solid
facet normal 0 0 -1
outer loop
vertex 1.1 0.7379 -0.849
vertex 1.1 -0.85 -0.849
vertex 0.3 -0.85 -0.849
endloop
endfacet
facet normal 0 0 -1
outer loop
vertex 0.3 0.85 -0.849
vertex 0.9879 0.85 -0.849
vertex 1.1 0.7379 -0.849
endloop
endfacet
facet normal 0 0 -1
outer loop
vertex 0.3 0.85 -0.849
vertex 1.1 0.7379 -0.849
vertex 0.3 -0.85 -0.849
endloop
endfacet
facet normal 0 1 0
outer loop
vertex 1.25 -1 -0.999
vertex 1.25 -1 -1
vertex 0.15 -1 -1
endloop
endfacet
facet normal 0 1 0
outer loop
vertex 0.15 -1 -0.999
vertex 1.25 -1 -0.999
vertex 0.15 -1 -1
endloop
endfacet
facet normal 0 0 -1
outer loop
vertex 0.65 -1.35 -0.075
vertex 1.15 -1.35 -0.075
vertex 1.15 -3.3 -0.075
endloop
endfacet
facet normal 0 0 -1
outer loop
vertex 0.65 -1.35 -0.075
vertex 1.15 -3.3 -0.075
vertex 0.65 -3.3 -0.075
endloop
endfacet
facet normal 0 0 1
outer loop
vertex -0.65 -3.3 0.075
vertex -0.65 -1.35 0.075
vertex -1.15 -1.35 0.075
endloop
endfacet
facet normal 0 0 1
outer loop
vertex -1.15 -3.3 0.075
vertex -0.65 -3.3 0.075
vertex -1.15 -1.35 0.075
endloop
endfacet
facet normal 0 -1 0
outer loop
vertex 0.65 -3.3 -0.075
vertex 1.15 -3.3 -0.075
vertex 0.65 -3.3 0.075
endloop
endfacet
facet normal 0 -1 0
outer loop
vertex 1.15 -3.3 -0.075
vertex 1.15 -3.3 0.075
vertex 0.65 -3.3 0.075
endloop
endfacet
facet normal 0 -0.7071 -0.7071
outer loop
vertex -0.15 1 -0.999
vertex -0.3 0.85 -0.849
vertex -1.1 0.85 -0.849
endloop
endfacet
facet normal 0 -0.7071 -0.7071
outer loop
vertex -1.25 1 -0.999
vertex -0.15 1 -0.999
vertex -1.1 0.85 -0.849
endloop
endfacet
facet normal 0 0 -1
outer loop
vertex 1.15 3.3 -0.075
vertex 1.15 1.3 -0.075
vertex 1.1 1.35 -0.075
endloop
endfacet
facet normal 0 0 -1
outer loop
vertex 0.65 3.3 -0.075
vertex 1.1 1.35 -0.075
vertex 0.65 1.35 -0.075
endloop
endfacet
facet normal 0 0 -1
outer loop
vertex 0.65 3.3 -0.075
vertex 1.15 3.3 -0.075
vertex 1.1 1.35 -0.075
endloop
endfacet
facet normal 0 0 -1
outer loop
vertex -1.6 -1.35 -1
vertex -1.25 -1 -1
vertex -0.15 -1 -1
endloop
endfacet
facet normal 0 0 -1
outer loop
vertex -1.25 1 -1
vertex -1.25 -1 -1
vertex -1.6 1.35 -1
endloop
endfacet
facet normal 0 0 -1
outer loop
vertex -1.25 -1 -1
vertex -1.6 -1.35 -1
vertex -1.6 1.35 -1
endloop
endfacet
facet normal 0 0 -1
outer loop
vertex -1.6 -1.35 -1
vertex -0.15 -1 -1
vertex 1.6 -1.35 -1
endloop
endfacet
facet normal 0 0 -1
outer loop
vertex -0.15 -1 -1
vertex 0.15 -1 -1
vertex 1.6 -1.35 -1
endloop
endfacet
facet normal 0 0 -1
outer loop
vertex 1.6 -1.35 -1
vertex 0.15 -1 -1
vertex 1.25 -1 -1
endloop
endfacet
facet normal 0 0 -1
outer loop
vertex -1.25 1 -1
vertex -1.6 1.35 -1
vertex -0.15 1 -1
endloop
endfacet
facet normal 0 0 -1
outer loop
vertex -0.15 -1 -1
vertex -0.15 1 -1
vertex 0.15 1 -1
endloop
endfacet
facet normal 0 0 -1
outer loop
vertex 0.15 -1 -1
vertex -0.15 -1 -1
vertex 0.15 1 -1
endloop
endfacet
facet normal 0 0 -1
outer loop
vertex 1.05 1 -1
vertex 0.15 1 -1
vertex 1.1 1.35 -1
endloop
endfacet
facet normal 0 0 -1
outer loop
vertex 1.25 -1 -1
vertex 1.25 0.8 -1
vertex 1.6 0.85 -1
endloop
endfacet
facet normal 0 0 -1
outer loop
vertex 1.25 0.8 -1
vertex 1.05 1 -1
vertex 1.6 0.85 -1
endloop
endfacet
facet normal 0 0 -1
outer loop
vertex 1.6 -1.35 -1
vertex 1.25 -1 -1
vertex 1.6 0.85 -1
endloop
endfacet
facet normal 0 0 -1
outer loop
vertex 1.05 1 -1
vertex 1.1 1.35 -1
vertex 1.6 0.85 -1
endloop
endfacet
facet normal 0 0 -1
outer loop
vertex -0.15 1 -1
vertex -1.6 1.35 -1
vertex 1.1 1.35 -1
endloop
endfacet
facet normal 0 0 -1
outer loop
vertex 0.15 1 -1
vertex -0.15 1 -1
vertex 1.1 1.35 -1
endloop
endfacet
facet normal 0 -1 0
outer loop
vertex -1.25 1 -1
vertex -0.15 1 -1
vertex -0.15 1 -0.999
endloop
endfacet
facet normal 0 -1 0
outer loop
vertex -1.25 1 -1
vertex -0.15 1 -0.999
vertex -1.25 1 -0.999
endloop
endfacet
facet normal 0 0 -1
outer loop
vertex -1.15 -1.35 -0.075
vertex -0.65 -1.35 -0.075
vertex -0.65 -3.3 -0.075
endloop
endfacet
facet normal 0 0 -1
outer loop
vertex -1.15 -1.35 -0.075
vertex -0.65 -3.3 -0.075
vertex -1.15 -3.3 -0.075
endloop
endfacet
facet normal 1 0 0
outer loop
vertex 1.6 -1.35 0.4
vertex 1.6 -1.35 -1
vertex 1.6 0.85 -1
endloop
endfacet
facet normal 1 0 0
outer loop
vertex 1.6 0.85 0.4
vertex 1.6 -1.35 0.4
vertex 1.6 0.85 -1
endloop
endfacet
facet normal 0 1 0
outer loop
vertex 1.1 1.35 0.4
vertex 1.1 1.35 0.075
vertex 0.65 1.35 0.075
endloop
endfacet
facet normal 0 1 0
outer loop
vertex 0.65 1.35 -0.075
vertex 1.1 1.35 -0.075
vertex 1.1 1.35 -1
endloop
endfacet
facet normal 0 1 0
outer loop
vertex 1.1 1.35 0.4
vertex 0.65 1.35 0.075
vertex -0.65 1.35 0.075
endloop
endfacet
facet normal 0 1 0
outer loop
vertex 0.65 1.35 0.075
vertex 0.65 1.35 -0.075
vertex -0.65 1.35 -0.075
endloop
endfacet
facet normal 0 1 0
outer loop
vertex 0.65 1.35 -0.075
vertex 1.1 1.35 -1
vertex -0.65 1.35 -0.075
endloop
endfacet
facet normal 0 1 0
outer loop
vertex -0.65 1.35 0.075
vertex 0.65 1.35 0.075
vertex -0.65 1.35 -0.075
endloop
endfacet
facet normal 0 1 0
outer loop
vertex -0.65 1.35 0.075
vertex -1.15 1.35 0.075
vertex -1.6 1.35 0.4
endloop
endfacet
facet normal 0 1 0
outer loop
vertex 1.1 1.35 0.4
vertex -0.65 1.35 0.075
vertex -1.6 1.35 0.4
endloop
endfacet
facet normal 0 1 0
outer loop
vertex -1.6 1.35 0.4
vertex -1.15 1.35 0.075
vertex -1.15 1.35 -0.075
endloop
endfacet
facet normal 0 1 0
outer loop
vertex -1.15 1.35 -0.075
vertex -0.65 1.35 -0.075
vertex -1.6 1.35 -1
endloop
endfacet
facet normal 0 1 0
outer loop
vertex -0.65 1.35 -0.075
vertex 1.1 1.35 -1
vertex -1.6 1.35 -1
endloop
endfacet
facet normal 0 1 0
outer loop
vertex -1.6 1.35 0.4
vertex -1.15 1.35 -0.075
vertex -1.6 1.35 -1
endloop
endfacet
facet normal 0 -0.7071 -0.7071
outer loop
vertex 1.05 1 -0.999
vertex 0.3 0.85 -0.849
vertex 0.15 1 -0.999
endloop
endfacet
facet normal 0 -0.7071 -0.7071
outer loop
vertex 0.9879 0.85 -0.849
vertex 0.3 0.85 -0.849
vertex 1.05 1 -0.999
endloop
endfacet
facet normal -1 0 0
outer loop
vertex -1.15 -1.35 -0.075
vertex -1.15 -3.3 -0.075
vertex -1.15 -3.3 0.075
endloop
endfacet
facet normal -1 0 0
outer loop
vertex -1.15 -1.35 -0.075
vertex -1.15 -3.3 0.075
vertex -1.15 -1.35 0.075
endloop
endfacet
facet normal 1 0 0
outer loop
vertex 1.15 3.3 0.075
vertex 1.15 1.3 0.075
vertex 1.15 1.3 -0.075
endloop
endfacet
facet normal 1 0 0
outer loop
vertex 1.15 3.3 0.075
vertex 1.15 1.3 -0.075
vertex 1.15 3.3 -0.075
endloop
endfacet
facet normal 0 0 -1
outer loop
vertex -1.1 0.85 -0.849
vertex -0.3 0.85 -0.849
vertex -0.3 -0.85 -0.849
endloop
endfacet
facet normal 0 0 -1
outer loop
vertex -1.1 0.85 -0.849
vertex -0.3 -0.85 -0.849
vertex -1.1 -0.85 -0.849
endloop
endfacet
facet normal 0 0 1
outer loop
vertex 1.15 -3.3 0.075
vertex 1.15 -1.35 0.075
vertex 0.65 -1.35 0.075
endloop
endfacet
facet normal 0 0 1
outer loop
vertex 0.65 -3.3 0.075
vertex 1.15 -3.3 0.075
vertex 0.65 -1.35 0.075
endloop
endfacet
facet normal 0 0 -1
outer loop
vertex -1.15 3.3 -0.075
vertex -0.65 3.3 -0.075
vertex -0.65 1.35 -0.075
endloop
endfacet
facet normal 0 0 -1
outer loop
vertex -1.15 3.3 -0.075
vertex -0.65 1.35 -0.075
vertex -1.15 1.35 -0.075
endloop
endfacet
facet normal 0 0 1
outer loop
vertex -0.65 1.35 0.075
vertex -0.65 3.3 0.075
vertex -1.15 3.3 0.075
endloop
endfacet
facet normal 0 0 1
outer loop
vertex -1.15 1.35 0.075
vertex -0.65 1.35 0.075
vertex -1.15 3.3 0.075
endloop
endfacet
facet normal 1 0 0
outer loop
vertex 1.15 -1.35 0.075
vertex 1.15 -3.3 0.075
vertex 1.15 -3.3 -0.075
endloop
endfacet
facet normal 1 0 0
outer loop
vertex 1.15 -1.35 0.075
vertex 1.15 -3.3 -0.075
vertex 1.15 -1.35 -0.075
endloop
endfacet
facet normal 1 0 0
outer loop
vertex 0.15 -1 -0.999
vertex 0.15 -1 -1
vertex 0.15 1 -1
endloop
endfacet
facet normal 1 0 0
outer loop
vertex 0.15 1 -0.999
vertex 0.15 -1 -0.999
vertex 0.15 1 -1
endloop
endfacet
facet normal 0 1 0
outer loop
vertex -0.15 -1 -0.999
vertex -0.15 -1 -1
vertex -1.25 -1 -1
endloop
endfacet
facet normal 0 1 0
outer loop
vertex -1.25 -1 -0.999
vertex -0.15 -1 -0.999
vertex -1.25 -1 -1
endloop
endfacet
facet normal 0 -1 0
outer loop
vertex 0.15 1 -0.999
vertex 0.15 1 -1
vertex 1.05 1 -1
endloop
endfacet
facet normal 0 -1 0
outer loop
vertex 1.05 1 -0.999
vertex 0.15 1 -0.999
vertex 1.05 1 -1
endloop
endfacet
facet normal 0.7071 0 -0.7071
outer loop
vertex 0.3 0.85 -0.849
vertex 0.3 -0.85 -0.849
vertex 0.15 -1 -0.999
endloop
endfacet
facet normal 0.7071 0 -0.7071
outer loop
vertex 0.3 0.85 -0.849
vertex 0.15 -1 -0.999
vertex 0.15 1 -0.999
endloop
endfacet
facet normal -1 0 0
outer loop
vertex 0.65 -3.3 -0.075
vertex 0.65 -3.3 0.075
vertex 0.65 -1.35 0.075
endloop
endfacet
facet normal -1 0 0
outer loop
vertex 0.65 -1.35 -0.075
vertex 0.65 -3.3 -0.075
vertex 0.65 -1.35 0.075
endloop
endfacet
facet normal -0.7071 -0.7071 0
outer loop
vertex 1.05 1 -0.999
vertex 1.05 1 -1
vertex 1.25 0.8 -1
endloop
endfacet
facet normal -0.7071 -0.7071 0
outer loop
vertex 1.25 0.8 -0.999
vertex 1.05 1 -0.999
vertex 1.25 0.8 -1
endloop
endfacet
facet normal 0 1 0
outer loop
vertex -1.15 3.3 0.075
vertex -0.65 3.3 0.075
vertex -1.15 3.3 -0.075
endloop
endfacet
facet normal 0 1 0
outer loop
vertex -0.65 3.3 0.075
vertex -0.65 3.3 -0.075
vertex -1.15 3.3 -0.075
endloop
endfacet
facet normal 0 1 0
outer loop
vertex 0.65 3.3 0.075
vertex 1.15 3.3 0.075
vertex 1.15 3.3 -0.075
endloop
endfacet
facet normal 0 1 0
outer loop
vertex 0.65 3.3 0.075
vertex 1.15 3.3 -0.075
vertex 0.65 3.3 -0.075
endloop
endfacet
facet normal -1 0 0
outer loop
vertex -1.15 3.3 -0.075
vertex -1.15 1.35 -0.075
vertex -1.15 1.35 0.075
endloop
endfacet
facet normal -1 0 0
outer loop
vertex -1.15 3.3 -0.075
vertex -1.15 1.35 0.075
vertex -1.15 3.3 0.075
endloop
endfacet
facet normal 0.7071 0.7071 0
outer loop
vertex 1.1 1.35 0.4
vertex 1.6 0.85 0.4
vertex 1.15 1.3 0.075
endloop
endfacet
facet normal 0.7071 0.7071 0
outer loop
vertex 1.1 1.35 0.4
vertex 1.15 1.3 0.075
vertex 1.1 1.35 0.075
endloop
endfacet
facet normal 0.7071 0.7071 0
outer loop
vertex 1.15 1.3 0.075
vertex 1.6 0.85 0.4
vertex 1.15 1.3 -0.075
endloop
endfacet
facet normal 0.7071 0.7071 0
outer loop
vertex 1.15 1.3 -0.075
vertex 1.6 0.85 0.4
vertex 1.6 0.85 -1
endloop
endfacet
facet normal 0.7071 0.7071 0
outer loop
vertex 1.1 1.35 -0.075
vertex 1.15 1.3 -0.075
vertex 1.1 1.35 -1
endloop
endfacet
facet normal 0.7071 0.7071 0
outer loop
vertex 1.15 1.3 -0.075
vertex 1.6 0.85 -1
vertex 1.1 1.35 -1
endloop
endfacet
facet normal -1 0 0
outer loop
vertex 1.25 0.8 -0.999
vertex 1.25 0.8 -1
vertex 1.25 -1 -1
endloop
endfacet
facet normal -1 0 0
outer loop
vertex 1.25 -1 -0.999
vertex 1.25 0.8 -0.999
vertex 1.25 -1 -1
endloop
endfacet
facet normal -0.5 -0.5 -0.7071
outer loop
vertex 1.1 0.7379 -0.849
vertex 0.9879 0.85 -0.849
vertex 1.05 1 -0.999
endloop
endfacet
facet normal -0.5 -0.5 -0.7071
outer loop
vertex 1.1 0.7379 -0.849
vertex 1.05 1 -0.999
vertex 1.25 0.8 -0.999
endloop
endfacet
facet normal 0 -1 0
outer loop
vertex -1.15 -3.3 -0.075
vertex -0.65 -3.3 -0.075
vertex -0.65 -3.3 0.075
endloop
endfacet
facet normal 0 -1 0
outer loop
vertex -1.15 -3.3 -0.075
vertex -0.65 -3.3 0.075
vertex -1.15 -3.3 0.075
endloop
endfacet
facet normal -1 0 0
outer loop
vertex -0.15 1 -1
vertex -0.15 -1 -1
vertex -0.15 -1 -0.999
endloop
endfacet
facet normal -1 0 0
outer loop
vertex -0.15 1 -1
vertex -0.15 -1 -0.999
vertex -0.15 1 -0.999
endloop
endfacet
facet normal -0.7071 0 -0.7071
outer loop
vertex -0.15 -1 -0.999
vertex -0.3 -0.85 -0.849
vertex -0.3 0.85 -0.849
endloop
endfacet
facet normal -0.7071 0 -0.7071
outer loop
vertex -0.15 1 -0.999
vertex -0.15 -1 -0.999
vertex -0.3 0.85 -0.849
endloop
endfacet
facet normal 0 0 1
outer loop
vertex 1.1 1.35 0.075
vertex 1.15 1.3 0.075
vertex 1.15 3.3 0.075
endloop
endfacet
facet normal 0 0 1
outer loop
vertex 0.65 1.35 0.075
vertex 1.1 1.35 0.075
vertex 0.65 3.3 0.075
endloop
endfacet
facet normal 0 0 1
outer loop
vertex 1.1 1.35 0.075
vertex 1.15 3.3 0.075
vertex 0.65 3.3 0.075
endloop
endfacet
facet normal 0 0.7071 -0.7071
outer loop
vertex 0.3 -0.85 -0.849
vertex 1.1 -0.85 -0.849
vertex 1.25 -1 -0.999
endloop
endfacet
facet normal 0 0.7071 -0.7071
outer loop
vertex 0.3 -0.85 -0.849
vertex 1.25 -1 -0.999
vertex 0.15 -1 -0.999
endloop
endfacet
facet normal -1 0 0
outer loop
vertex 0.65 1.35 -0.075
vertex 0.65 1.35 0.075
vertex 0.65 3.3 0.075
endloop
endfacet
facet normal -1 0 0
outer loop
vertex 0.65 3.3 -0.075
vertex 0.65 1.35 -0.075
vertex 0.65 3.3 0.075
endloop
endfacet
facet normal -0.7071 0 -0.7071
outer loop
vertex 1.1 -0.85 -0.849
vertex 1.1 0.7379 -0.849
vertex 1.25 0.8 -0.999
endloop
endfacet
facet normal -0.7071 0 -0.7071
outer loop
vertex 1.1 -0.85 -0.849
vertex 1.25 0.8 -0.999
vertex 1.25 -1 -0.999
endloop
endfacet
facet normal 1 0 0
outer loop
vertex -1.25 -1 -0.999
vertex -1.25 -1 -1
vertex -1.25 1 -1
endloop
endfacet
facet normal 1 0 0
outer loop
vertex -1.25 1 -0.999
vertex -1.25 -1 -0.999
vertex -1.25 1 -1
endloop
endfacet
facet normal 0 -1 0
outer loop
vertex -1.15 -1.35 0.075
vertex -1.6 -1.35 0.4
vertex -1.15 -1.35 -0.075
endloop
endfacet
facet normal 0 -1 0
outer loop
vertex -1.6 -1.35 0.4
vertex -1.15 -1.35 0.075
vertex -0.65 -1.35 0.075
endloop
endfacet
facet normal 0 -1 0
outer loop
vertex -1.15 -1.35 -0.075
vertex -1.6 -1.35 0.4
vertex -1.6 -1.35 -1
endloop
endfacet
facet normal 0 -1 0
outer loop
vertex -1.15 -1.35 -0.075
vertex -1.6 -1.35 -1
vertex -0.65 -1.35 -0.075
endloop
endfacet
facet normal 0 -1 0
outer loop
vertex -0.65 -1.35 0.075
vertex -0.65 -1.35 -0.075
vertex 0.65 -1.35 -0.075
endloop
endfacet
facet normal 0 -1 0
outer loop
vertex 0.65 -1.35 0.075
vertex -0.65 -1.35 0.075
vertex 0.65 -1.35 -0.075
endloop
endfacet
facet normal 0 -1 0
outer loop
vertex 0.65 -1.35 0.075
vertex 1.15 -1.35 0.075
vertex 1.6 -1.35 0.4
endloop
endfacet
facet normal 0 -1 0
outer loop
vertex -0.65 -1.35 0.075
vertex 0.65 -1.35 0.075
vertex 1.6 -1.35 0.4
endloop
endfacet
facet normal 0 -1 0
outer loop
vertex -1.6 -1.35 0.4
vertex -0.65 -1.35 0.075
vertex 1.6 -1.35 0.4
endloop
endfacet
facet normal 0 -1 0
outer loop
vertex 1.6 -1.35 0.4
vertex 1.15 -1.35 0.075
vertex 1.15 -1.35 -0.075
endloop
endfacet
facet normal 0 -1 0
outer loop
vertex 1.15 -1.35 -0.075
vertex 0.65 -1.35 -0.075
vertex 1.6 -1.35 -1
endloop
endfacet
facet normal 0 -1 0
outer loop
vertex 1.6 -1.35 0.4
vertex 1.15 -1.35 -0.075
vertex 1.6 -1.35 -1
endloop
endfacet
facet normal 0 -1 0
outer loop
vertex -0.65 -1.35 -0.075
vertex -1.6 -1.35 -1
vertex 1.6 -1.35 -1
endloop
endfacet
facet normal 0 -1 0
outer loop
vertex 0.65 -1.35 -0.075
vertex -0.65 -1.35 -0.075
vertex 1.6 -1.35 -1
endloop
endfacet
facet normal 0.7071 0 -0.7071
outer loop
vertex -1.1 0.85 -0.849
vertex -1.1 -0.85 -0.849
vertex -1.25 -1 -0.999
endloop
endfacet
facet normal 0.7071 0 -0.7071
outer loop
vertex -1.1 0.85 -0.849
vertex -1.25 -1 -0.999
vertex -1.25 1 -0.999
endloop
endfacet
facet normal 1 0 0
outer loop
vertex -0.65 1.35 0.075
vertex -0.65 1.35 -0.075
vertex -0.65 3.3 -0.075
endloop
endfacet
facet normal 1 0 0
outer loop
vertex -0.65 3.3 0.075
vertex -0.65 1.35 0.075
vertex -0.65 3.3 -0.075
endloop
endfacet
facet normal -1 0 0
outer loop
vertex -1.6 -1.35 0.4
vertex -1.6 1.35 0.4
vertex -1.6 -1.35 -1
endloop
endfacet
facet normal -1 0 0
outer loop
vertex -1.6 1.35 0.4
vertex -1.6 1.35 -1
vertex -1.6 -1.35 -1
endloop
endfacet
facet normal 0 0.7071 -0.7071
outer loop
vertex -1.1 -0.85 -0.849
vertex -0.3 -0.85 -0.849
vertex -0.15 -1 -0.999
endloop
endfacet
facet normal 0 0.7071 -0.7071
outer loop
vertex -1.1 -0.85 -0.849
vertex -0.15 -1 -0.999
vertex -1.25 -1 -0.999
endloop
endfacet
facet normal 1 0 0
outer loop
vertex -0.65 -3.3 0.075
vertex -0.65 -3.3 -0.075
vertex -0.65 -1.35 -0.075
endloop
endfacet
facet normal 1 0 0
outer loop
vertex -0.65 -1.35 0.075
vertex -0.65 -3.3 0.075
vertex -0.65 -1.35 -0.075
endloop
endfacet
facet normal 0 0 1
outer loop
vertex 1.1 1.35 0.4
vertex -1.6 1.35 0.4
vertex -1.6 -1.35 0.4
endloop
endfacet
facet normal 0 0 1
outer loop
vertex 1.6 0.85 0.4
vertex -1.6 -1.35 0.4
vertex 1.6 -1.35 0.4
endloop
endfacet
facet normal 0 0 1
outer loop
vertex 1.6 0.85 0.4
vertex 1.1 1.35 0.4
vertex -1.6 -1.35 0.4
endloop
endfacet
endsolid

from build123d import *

# Parameters (mm, degrees)
SKETCH002_W                   = 0.5
SKETCH002_H                   = 6.6
PAD001_DEPTH                  = 0.075
PAD_DEPTH                     = 1
PAD_DEPTH_BACK                = 0.4
SKETCH001_W                   = 1.1
SKETCH001_H                   = 2
POCKET_DEPTH                  = 0.151
CHAMFER_SIZE                  = 0.15
CHAMFER_MP_CP_PLACEMENT_ANGLE = 180


with BuildPart() as pad001:
    # Sketch002 → Pad001 (new body, symmetric)
    with BuildSketch(Plane.XY):
        with Locations((-0.9, 0)):
            Rectangle(SKETCH002_W, SKETCH002_H)
        with Locations((0.9, 0)):
            Rectangle(SKETCH002_W, SKETCH002_H)
    extrude(amount=PAD001_DEPTH, both=True)


with BuildPart() as everlight_itr8307_reverse:
    # Sketch → Pad (new body, two sides)
    with BuildSketch(Plane.XY) as pad_sk:
        Polygon((-1.1, 1.35), (1.6, 1.35), (1.6, -1.35), (-1.6, -1.35), (-1.6, 0.85), align=None)
    extrude(amount=PAD_DEPTH)
    extrude(pad_sk.sketch, amount=-PAD_DEPTH_BACK)

    # Sketch001 → Pocket (cut)
    with BuildSketch(Plane.XY.offset(1)):
        Polygon((-1.25, -1), (-0.15, -1), (-0.15, 1), (-1.05, 1), (-1.25, 0.8), align=None)
        with Locations((0.7, 0)):
            Rectangle(SKETCH001_W, SKETCH001_H)
    extrude(amount=-POCKET_DEPTH, mode=Mode.SUBTRACT)

    # Chamfer
    chamfer_edges = [everlight_itr8307_reverse.edges().sort_by_distance(p)[0] for p in [
        (-1.15, 0.9, 0.849),
        (-0.6, 1, 0.849),
        (-1.25, -0.1, 0.849),
        (0.15, 0, 0.849),
        (0.7, 1, 0.849),
        (1.25, 0, 0.849),
        (-0.15, 0, 0.849),
        (0.7, -1, 0.849),
        (-0.7, -1, 0.849),
    ]]
    chamfer(chamfer_edges, length=CHAMFER_SIZE)

    # Chamfer_mp_cp: union Pad001
    add(pad001.part)


with BuildPart() as everlight_itr8307_reverse_1:
    # Chamfer_mp_cp placement: moved
    add(everlight_itr8307_reverse.part.rotate(Axis((0, 0, 0), (0, 1, 0)), CHAMFER_MP_CP_PLACEMENT_ANGLE))


solid = everlight_itr8307_reverse_1.part
